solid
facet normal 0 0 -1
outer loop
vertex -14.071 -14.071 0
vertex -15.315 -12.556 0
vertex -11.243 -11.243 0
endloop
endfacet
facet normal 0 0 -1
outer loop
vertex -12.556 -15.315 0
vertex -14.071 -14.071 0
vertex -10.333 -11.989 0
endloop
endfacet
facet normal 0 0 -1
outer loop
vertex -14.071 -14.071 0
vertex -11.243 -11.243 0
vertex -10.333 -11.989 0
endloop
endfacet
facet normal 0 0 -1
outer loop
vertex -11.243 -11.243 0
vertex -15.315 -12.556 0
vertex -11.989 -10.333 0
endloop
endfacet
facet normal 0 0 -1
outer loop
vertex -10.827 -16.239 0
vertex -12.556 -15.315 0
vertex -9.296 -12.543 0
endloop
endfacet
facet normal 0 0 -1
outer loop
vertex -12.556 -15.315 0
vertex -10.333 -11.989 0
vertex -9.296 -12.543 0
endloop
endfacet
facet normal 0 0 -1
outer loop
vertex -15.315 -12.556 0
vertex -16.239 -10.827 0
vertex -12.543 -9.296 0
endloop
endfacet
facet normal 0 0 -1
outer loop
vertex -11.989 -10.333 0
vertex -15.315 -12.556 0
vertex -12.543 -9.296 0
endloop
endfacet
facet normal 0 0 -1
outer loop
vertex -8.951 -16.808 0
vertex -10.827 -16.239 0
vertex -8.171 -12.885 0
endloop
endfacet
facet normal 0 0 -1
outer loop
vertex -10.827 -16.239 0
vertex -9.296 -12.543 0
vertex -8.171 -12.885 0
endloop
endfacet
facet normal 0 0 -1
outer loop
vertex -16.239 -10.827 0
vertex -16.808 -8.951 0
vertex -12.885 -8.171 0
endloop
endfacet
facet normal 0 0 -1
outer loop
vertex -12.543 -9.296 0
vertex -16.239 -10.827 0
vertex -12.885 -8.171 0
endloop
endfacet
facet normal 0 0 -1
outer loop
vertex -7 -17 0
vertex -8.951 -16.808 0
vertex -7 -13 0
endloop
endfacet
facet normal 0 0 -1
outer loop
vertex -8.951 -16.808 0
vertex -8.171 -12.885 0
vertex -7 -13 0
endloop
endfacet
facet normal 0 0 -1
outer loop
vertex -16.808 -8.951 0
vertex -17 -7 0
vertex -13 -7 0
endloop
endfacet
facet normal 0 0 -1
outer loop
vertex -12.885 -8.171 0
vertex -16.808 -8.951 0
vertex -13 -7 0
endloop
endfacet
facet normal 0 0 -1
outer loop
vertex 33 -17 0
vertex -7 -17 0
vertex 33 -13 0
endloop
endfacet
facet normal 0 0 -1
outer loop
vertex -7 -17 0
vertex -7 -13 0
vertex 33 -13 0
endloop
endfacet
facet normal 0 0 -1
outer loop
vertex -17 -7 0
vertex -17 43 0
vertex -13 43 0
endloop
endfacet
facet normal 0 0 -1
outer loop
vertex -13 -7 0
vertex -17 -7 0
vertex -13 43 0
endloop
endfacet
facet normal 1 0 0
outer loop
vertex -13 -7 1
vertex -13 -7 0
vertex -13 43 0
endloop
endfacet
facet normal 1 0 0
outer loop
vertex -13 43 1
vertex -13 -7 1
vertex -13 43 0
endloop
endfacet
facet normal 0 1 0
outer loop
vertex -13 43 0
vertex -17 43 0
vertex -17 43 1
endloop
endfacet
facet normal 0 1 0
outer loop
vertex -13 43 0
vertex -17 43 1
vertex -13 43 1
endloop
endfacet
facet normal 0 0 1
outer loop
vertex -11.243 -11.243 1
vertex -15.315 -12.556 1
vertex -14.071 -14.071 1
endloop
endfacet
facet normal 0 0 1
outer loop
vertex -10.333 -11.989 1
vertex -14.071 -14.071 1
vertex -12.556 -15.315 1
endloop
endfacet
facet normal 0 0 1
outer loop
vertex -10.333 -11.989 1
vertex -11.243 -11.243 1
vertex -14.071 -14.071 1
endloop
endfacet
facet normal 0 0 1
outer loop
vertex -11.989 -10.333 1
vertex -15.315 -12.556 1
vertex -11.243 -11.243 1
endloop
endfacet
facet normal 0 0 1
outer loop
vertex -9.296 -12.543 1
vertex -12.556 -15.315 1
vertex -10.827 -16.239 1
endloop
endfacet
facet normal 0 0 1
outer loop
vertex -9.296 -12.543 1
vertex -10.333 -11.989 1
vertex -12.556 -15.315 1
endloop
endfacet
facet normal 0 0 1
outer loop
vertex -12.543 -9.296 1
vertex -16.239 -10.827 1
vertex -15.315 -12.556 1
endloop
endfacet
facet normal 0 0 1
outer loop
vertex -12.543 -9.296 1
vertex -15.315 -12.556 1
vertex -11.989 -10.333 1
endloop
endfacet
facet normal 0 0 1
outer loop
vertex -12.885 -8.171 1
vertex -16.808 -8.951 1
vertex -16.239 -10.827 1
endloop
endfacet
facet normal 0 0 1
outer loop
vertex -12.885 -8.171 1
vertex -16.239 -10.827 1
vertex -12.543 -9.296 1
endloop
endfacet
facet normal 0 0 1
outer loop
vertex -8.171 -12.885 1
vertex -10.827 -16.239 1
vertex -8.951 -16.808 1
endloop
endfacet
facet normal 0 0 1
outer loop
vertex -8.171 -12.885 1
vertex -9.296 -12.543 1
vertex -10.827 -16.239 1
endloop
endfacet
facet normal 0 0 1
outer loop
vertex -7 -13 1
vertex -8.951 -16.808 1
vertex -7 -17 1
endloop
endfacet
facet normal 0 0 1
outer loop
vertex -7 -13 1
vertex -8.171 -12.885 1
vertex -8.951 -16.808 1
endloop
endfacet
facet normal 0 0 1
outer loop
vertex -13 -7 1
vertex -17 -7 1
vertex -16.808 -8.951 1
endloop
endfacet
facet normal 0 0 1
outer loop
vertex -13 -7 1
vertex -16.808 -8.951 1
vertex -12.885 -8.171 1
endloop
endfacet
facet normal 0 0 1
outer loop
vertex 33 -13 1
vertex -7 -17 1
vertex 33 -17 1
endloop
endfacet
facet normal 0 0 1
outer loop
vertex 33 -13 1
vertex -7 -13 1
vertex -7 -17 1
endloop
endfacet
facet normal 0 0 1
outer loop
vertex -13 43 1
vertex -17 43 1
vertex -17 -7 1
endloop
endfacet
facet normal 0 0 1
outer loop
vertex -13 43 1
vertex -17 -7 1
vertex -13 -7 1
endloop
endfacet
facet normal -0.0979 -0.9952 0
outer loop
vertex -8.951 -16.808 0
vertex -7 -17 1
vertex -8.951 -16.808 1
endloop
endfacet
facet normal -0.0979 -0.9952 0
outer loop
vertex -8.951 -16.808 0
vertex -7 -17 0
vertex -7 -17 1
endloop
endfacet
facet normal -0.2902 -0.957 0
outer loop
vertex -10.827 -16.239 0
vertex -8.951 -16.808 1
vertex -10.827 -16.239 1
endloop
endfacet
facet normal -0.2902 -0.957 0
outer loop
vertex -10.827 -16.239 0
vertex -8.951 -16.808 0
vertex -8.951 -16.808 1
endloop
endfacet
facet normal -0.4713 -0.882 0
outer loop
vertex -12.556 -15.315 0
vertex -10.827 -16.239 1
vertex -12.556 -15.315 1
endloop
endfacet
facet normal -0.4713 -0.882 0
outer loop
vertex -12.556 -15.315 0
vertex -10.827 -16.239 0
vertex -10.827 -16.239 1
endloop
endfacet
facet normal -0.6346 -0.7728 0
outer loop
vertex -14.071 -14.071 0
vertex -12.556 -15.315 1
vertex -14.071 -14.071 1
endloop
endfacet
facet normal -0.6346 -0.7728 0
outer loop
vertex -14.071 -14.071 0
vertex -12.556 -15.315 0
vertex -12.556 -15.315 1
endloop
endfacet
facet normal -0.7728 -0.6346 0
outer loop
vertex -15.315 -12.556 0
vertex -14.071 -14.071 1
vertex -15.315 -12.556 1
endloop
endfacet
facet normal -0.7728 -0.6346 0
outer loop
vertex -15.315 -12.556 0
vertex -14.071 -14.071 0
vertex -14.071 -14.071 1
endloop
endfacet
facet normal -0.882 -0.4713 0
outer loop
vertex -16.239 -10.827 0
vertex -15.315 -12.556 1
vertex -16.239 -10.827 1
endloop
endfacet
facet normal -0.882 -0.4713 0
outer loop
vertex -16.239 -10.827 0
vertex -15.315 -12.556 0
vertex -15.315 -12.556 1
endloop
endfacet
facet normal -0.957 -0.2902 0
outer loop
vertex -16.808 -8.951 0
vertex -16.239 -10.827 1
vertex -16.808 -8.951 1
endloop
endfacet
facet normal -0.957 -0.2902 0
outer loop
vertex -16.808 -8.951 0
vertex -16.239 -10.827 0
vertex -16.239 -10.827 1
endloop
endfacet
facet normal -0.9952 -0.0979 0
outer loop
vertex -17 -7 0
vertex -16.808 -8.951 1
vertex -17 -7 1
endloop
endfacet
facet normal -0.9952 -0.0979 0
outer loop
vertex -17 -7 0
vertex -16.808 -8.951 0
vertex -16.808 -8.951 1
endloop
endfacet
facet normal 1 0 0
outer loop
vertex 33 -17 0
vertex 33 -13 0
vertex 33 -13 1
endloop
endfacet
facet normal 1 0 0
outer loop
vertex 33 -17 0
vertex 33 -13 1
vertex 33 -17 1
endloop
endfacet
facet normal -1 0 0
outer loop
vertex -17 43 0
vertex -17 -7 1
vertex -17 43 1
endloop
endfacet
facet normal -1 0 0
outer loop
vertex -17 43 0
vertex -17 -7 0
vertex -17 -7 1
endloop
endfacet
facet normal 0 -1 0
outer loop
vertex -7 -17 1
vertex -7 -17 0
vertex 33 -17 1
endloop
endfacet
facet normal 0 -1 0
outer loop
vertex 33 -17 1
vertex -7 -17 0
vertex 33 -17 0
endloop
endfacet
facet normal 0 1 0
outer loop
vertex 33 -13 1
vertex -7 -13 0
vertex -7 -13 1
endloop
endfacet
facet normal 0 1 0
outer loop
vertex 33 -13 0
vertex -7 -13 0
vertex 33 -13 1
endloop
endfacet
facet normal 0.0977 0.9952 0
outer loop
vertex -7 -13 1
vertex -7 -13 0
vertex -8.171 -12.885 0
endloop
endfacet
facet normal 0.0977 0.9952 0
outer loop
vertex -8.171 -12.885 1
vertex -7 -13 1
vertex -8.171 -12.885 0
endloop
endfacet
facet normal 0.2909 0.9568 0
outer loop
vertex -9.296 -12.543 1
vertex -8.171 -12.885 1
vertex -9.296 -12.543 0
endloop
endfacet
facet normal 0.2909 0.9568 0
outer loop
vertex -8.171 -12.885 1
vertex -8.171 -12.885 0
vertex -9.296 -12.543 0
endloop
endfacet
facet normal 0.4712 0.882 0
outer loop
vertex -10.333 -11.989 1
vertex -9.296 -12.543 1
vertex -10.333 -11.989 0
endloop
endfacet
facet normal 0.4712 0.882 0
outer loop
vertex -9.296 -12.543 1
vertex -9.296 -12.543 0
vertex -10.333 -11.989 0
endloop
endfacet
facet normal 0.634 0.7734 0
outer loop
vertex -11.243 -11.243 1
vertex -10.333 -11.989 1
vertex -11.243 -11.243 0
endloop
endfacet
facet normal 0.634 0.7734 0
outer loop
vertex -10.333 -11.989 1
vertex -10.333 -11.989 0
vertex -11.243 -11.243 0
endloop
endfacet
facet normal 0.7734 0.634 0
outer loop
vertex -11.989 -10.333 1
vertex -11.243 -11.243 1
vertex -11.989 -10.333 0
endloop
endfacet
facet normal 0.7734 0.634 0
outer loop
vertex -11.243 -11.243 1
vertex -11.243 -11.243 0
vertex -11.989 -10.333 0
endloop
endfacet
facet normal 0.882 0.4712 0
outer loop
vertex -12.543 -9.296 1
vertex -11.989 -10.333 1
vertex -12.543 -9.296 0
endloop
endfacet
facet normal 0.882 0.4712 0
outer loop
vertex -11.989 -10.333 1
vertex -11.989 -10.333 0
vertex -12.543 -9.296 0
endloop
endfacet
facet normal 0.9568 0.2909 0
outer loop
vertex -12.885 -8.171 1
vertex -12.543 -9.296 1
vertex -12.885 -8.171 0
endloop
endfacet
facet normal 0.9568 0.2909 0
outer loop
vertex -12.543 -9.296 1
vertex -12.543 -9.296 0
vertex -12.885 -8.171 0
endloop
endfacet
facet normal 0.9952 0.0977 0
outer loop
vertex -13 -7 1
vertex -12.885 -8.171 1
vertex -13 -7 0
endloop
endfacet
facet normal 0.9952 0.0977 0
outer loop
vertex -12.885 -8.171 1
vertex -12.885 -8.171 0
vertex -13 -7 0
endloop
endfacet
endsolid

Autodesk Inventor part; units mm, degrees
ref_plane "YZ Plane" through (0, 0, 0) normal (1, 0, 0) x (0, 1, 0)
ref_plane "Начальная плоскость" through (0, 0, 0) normal (0, 0, 1) x (1, 0, 0)
ref_plane "Конечная плоскость" through (0, 0, 1) normal (0, 0, 1) x (1, 0, 0)
sketch "Эскиз" plane through (0, 0, 0) normal (0, 0, 1) x (1, 0, 0)
  line L0 (-13, -7) -> (-13, 43)
  line L1 (-17, 43) -> (-13, 43)
  line L2 (-17, -7) -> (-17, 43)
  line L3 (-7, -17) -> (33, -17)
  line L4 (33, -13) -> (33, -17)
  line L5 (-7, -13) -> (33, -13)
  arc A0 (-13, -7) -> (-7, -13) centre (-7, -7) ccw
  arc A1 (-17, -7) -> (-7, -17) centre (-7, -7) ccw
  line L6 (-17, 0) -> (23, 0) construction
  line L7 (0, -17) -> (0, 33) construction
  line L8 (0, 0) -> (50, 0) construction
  point P0 (-13, -13)
  point P1 (-17, -17)
  dimension "d17" = 6
  dimension "d18" = 10
  dimension "d25" = 17
  dimension "d26" = 17
  dimension "d27" = 90
  dimension "d28" = 50
  dimension "d29" = 60
  dimension "d30" = 4
  dimension "d31" = 4
  dimension "d32" = 50
extrude "Базовый элемент" add sketch "Эскиз" along normal up to surface (1 mm away) from surface at 0
sketch "Sketch3" plane through (0, 0, 0) normal (0, 0, 1) x (1, 0, 0)
  line L0 (0, 0) -> (10, 0)
ref_plane "Work Plane10" through (0, 0, 0) normal (0, -1, 0) x (1, 0, 0)
sketch "Sketch4" plane through (0, 0, 0) normal (0, -1, 0) x (1, 0, 0)
  line L0 (-2, 0) -> (12, 0)
  line L1 (-2, 1) -> (12, 1)
  dimension "d24" = 1
equation "\"d17\" = R"
equation "\"d18\" = R + ParT"
equation "\"d25\" = ey"
equation "\"d26\" = ex"
equation "\"d28\" = a"
equation "\"d29\" = b"
equation "\"d30\" = ParT"
equation "\"d31\" = ParT"
equation "\"d32\" = d28"
equation "\"d11\" = G_L"
equation "\"b\" = 60"
equation "\"ParT\" = 4"
equation "\"R\" = 6"
equation "\"G_L\" = d24"
equation "\"G_OFFSET_START\" = 0"
equation "\"G_OFFSET_END\" = 0"
equation "\"d20\" = G_OFFSET_END + B_L"
equation "\"ex\" = 17"
equation "\"ey\" = ex"
equation "\"B_L\" = 1"
equation "\"a\" = 50"
properties part number "ДСТУ 2254-93 (Гнутий рівнобокий)" material "С245 ДСТУ 8539"
